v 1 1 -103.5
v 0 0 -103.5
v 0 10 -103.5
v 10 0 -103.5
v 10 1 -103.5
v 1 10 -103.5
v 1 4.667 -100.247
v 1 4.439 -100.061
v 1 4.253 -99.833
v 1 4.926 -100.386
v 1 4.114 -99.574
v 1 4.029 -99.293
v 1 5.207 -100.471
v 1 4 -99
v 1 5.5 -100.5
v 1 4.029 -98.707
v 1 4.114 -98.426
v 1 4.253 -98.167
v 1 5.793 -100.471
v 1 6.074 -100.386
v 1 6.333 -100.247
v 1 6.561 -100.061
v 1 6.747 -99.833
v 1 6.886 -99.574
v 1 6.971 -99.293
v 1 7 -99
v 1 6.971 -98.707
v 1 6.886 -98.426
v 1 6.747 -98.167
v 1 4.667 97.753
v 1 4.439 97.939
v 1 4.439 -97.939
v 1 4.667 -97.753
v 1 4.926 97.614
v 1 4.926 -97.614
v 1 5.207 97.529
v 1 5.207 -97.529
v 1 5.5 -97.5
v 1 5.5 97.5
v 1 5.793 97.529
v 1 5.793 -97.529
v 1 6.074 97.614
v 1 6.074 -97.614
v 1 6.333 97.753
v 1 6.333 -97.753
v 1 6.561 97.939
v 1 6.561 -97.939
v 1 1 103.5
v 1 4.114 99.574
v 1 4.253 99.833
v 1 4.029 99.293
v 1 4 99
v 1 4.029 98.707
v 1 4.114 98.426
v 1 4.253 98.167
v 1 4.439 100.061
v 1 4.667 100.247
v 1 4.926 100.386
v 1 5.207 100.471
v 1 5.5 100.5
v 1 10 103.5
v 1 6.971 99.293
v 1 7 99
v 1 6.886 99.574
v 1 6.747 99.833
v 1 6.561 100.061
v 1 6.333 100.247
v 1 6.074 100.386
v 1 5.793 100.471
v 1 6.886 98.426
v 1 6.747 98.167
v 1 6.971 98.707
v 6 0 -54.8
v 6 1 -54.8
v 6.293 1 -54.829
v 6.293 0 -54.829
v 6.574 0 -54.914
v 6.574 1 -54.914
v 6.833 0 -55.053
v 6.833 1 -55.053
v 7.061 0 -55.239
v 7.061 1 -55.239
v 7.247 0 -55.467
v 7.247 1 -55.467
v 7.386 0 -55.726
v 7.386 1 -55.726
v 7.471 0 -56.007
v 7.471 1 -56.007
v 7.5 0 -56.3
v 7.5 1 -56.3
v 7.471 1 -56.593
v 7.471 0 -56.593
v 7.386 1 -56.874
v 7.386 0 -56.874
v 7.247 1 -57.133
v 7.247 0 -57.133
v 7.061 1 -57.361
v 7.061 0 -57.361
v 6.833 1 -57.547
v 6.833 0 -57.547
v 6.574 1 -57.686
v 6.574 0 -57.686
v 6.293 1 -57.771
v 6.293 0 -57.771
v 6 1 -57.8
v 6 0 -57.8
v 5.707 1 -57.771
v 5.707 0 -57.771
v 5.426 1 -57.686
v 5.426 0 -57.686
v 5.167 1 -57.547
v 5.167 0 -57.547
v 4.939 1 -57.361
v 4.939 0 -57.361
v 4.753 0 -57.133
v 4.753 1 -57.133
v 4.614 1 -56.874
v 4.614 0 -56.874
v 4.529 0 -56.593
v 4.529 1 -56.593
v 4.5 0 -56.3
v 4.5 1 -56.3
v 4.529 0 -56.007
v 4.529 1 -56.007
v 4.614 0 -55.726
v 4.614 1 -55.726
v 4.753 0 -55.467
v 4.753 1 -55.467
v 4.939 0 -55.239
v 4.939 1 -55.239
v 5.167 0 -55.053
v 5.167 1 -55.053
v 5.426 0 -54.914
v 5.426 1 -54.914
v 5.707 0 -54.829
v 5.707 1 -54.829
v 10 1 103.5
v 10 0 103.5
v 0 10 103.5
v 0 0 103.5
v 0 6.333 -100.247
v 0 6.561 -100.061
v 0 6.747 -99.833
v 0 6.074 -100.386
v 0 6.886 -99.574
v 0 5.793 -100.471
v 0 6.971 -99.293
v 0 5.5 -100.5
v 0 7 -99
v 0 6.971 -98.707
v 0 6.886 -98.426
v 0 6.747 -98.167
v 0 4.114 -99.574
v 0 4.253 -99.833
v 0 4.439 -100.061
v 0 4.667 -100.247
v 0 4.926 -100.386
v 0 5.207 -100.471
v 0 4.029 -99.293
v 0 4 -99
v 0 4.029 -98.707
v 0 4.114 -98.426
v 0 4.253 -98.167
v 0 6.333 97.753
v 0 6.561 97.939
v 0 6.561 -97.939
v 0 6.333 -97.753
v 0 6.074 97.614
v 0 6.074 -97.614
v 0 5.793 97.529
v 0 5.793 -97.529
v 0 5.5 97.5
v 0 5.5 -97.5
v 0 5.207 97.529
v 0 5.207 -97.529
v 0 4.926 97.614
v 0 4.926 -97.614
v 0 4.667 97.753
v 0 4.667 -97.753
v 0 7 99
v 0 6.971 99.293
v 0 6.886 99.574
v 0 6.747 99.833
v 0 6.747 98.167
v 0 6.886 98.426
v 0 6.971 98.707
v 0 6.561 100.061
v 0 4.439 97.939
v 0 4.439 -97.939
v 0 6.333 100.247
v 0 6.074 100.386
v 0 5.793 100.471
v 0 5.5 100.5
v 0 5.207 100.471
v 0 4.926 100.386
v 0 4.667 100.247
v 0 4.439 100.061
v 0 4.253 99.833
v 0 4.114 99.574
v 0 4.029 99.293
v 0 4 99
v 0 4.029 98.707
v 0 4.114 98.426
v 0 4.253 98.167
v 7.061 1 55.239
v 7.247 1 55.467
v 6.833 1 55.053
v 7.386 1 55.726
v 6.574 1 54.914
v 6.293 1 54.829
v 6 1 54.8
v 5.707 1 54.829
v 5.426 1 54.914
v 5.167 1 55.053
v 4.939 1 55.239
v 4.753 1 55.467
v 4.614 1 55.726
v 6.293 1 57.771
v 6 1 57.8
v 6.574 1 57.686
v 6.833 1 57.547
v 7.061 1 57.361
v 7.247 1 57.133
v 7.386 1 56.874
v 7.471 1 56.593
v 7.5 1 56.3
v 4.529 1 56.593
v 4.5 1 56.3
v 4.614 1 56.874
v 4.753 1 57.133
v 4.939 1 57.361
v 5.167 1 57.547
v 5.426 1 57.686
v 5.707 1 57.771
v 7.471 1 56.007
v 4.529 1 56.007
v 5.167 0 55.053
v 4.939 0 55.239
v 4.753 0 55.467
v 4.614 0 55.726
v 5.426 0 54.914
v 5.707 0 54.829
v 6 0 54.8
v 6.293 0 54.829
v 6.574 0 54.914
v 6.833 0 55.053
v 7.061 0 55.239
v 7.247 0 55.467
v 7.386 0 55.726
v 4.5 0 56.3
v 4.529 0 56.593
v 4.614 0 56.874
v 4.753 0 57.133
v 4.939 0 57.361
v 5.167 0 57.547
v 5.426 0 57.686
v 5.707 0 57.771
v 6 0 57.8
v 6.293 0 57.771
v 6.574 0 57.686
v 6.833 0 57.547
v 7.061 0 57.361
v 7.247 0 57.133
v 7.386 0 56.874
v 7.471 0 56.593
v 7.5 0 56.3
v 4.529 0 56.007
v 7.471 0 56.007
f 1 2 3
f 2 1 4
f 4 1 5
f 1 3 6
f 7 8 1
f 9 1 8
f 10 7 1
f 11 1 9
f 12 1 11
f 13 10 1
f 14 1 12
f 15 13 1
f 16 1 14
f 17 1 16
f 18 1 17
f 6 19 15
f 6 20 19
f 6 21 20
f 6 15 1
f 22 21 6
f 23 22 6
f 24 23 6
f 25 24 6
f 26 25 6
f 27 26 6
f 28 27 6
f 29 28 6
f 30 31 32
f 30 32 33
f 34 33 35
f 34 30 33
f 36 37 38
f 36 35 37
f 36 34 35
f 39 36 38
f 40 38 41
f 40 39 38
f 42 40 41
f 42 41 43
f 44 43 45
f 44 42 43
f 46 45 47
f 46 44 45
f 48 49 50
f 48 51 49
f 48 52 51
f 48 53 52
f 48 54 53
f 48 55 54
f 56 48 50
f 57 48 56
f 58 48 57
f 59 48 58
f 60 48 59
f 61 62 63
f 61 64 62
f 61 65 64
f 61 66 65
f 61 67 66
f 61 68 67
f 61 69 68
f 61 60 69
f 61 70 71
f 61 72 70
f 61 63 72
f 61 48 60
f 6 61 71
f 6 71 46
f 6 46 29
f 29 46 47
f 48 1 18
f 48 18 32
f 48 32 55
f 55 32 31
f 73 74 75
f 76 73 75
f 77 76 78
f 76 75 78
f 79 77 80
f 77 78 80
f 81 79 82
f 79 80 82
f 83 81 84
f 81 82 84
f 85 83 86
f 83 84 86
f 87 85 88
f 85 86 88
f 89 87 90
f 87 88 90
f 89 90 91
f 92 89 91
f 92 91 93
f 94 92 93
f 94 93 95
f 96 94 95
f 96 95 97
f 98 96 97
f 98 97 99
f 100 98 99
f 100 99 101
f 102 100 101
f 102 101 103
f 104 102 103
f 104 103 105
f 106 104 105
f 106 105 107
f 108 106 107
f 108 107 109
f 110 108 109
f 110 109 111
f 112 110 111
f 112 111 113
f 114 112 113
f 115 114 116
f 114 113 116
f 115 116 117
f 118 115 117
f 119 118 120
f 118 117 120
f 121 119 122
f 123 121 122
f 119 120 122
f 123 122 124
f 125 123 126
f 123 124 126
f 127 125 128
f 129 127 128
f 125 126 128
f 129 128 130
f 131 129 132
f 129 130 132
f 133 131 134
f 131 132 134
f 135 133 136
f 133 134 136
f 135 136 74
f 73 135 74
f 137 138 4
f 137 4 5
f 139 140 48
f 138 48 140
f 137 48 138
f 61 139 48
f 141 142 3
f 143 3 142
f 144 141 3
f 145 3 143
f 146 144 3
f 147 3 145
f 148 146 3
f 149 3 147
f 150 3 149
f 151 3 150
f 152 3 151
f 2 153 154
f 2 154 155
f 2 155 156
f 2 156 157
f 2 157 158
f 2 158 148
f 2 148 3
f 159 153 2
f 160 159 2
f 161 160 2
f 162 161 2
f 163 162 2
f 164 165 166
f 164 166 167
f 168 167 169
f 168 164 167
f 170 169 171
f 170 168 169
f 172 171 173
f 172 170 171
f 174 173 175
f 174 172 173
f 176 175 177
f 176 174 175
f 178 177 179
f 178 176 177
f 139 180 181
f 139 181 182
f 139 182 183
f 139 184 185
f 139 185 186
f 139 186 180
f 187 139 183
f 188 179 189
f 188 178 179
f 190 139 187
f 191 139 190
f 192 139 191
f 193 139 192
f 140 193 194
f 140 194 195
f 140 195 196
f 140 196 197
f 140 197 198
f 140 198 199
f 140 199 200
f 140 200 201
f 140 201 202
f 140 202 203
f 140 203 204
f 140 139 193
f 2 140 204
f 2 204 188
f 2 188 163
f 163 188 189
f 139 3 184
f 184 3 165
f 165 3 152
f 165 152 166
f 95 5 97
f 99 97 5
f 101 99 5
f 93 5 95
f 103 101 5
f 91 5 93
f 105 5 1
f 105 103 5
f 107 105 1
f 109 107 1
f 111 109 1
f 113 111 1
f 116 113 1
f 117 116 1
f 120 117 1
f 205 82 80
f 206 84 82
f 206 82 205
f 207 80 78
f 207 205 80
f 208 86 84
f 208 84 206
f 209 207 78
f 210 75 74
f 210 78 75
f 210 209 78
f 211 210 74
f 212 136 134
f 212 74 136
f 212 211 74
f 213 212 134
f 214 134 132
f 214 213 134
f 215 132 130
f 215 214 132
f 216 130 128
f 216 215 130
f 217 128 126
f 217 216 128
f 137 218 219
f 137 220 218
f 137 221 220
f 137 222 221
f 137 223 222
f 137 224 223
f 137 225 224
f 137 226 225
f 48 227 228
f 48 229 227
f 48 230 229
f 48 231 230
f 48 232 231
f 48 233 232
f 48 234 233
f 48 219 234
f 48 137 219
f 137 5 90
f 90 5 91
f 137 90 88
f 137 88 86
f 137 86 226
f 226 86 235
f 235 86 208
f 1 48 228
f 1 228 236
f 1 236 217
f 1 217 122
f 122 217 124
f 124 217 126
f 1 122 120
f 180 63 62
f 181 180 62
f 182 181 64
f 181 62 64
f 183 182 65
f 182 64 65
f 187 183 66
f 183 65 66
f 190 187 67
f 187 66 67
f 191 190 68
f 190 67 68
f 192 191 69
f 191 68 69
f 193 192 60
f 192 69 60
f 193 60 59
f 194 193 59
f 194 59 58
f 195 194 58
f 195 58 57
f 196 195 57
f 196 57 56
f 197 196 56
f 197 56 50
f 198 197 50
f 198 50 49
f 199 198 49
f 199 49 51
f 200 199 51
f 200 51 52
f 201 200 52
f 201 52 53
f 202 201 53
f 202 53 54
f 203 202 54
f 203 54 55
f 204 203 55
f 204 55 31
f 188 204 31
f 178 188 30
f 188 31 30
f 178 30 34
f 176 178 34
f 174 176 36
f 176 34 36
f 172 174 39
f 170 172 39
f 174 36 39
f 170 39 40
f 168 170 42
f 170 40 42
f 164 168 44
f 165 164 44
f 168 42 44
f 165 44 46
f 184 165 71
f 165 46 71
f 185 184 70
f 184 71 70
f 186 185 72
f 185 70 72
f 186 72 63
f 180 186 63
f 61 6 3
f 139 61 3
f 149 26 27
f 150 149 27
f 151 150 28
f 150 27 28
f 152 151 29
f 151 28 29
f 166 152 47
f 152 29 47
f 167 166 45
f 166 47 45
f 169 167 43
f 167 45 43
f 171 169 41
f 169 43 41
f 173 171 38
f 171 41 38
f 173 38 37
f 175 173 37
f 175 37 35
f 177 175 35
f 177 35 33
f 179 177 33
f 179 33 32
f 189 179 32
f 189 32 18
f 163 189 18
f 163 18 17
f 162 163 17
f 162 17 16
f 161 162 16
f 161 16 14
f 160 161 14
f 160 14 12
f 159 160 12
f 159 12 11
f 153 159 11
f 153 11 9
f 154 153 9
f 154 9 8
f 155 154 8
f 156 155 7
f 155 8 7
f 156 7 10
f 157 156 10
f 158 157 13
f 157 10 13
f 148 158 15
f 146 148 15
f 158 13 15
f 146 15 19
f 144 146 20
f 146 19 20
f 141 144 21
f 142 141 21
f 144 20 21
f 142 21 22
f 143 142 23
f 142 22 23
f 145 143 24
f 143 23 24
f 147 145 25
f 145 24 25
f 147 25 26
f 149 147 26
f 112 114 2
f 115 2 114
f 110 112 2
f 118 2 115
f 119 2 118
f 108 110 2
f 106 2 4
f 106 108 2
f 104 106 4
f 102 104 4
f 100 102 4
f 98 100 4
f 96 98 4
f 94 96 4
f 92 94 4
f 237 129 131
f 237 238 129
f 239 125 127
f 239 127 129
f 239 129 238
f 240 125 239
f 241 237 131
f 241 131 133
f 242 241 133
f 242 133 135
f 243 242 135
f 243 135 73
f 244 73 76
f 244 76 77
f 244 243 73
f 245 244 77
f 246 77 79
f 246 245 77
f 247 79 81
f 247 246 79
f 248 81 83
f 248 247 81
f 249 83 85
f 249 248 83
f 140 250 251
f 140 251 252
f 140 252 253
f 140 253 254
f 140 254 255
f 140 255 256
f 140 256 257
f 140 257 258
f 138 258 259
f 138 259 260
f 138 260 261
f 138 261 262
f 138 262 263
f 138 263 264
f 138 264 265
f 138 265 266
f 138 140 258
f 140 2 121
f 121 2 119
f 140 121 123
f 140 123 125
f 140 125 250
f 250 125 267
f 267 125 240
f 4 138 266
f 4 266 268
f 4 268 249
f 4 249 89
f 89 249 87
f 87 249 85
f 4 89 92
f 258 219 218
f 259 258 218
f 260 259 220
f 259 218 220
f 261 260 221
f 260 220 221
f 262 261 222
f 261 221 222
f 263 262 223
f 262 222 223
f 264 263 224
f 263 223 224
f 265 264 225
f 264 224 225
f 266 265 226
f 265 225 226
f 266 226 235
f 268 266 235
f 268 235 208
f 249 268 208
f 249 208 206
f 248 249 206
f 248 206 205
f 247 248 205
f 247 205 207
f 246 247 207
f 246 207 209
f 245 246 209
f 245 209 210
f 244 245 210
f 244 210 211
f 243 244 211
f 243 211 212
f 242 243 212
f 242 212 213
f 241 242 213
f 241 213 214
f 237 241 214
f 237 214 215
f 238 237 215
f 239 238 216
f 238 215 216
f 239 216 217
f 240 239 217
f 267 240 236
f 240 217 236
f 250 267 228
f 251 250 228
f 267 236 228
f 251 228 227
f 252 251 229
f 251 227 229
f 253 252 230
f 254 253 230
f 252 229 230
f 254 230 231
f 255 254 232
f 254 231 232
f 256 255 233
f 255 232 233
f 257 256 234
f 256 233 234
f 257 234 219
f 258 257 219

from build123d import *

# Parameters (mm, degrees)
EXTRU_MINCE1_DEPTH      = 103.5
ESQUISSE2_R             = 1.5
ENL_V_MAT_EXTRU_1_DEPTH = 3
ESQUISSE3_R             = 1.5
ENL_V_MAT_EXTRU_2_DEPTH = 3


with BuildPart() as part:
    # Esquisse1 → Extru.-Mince1 (new, symmetric)
    with BuildSketch(Plane.XY):
        Polygon((0, 10), (0, 0), (10, 0), (10, 1), (1, 1), (1, 10), align=None)
    extrude(amount=EXTRU_MINCE1_DEPTH, both=True)

    # Esquisse2 → Enlèv. mat.-Extru.1 (cut)
    with BuildSketch(Plane(origin=(0, 1, 0), x_dir=(1, 0, 0), z_dir=(0, 1, 0))):
        with Locations(Location((6, 56.3, 0), (0, 0, 270))):
            Circle(ESQUISSE2_R)
        with Locations(Location((6, -56.3, 0), (0, 0, 270))):
            Circle(ESQUISSE2_R)
    extrude(amount=-ENL_V_MAT_EXTRU_1_DEPTH, mode=Mode.SUBTRACT)

    # Esquisse3 → Enlèv. mat.-Extru.2 (cut)
    with BuildSketch(Plane(origin=(1, 0, 0), x_dir=(0, 0, -1), z_dir=(1, 0, 0))):
        with Locations(Location((-99, 5.5, 0), (0, 0, 90))):
            Circle(ESQUISSE3_R)
        with Locations(Location((99, 5.5, 0), (0, 0, 90))):
            Circle(ESQUISSE3_R)
    extrude(amount=-ENL_V_MAT_EXTRU_2_DEPTH, mode=Mode.SUBTRACT)


solid = part.part
